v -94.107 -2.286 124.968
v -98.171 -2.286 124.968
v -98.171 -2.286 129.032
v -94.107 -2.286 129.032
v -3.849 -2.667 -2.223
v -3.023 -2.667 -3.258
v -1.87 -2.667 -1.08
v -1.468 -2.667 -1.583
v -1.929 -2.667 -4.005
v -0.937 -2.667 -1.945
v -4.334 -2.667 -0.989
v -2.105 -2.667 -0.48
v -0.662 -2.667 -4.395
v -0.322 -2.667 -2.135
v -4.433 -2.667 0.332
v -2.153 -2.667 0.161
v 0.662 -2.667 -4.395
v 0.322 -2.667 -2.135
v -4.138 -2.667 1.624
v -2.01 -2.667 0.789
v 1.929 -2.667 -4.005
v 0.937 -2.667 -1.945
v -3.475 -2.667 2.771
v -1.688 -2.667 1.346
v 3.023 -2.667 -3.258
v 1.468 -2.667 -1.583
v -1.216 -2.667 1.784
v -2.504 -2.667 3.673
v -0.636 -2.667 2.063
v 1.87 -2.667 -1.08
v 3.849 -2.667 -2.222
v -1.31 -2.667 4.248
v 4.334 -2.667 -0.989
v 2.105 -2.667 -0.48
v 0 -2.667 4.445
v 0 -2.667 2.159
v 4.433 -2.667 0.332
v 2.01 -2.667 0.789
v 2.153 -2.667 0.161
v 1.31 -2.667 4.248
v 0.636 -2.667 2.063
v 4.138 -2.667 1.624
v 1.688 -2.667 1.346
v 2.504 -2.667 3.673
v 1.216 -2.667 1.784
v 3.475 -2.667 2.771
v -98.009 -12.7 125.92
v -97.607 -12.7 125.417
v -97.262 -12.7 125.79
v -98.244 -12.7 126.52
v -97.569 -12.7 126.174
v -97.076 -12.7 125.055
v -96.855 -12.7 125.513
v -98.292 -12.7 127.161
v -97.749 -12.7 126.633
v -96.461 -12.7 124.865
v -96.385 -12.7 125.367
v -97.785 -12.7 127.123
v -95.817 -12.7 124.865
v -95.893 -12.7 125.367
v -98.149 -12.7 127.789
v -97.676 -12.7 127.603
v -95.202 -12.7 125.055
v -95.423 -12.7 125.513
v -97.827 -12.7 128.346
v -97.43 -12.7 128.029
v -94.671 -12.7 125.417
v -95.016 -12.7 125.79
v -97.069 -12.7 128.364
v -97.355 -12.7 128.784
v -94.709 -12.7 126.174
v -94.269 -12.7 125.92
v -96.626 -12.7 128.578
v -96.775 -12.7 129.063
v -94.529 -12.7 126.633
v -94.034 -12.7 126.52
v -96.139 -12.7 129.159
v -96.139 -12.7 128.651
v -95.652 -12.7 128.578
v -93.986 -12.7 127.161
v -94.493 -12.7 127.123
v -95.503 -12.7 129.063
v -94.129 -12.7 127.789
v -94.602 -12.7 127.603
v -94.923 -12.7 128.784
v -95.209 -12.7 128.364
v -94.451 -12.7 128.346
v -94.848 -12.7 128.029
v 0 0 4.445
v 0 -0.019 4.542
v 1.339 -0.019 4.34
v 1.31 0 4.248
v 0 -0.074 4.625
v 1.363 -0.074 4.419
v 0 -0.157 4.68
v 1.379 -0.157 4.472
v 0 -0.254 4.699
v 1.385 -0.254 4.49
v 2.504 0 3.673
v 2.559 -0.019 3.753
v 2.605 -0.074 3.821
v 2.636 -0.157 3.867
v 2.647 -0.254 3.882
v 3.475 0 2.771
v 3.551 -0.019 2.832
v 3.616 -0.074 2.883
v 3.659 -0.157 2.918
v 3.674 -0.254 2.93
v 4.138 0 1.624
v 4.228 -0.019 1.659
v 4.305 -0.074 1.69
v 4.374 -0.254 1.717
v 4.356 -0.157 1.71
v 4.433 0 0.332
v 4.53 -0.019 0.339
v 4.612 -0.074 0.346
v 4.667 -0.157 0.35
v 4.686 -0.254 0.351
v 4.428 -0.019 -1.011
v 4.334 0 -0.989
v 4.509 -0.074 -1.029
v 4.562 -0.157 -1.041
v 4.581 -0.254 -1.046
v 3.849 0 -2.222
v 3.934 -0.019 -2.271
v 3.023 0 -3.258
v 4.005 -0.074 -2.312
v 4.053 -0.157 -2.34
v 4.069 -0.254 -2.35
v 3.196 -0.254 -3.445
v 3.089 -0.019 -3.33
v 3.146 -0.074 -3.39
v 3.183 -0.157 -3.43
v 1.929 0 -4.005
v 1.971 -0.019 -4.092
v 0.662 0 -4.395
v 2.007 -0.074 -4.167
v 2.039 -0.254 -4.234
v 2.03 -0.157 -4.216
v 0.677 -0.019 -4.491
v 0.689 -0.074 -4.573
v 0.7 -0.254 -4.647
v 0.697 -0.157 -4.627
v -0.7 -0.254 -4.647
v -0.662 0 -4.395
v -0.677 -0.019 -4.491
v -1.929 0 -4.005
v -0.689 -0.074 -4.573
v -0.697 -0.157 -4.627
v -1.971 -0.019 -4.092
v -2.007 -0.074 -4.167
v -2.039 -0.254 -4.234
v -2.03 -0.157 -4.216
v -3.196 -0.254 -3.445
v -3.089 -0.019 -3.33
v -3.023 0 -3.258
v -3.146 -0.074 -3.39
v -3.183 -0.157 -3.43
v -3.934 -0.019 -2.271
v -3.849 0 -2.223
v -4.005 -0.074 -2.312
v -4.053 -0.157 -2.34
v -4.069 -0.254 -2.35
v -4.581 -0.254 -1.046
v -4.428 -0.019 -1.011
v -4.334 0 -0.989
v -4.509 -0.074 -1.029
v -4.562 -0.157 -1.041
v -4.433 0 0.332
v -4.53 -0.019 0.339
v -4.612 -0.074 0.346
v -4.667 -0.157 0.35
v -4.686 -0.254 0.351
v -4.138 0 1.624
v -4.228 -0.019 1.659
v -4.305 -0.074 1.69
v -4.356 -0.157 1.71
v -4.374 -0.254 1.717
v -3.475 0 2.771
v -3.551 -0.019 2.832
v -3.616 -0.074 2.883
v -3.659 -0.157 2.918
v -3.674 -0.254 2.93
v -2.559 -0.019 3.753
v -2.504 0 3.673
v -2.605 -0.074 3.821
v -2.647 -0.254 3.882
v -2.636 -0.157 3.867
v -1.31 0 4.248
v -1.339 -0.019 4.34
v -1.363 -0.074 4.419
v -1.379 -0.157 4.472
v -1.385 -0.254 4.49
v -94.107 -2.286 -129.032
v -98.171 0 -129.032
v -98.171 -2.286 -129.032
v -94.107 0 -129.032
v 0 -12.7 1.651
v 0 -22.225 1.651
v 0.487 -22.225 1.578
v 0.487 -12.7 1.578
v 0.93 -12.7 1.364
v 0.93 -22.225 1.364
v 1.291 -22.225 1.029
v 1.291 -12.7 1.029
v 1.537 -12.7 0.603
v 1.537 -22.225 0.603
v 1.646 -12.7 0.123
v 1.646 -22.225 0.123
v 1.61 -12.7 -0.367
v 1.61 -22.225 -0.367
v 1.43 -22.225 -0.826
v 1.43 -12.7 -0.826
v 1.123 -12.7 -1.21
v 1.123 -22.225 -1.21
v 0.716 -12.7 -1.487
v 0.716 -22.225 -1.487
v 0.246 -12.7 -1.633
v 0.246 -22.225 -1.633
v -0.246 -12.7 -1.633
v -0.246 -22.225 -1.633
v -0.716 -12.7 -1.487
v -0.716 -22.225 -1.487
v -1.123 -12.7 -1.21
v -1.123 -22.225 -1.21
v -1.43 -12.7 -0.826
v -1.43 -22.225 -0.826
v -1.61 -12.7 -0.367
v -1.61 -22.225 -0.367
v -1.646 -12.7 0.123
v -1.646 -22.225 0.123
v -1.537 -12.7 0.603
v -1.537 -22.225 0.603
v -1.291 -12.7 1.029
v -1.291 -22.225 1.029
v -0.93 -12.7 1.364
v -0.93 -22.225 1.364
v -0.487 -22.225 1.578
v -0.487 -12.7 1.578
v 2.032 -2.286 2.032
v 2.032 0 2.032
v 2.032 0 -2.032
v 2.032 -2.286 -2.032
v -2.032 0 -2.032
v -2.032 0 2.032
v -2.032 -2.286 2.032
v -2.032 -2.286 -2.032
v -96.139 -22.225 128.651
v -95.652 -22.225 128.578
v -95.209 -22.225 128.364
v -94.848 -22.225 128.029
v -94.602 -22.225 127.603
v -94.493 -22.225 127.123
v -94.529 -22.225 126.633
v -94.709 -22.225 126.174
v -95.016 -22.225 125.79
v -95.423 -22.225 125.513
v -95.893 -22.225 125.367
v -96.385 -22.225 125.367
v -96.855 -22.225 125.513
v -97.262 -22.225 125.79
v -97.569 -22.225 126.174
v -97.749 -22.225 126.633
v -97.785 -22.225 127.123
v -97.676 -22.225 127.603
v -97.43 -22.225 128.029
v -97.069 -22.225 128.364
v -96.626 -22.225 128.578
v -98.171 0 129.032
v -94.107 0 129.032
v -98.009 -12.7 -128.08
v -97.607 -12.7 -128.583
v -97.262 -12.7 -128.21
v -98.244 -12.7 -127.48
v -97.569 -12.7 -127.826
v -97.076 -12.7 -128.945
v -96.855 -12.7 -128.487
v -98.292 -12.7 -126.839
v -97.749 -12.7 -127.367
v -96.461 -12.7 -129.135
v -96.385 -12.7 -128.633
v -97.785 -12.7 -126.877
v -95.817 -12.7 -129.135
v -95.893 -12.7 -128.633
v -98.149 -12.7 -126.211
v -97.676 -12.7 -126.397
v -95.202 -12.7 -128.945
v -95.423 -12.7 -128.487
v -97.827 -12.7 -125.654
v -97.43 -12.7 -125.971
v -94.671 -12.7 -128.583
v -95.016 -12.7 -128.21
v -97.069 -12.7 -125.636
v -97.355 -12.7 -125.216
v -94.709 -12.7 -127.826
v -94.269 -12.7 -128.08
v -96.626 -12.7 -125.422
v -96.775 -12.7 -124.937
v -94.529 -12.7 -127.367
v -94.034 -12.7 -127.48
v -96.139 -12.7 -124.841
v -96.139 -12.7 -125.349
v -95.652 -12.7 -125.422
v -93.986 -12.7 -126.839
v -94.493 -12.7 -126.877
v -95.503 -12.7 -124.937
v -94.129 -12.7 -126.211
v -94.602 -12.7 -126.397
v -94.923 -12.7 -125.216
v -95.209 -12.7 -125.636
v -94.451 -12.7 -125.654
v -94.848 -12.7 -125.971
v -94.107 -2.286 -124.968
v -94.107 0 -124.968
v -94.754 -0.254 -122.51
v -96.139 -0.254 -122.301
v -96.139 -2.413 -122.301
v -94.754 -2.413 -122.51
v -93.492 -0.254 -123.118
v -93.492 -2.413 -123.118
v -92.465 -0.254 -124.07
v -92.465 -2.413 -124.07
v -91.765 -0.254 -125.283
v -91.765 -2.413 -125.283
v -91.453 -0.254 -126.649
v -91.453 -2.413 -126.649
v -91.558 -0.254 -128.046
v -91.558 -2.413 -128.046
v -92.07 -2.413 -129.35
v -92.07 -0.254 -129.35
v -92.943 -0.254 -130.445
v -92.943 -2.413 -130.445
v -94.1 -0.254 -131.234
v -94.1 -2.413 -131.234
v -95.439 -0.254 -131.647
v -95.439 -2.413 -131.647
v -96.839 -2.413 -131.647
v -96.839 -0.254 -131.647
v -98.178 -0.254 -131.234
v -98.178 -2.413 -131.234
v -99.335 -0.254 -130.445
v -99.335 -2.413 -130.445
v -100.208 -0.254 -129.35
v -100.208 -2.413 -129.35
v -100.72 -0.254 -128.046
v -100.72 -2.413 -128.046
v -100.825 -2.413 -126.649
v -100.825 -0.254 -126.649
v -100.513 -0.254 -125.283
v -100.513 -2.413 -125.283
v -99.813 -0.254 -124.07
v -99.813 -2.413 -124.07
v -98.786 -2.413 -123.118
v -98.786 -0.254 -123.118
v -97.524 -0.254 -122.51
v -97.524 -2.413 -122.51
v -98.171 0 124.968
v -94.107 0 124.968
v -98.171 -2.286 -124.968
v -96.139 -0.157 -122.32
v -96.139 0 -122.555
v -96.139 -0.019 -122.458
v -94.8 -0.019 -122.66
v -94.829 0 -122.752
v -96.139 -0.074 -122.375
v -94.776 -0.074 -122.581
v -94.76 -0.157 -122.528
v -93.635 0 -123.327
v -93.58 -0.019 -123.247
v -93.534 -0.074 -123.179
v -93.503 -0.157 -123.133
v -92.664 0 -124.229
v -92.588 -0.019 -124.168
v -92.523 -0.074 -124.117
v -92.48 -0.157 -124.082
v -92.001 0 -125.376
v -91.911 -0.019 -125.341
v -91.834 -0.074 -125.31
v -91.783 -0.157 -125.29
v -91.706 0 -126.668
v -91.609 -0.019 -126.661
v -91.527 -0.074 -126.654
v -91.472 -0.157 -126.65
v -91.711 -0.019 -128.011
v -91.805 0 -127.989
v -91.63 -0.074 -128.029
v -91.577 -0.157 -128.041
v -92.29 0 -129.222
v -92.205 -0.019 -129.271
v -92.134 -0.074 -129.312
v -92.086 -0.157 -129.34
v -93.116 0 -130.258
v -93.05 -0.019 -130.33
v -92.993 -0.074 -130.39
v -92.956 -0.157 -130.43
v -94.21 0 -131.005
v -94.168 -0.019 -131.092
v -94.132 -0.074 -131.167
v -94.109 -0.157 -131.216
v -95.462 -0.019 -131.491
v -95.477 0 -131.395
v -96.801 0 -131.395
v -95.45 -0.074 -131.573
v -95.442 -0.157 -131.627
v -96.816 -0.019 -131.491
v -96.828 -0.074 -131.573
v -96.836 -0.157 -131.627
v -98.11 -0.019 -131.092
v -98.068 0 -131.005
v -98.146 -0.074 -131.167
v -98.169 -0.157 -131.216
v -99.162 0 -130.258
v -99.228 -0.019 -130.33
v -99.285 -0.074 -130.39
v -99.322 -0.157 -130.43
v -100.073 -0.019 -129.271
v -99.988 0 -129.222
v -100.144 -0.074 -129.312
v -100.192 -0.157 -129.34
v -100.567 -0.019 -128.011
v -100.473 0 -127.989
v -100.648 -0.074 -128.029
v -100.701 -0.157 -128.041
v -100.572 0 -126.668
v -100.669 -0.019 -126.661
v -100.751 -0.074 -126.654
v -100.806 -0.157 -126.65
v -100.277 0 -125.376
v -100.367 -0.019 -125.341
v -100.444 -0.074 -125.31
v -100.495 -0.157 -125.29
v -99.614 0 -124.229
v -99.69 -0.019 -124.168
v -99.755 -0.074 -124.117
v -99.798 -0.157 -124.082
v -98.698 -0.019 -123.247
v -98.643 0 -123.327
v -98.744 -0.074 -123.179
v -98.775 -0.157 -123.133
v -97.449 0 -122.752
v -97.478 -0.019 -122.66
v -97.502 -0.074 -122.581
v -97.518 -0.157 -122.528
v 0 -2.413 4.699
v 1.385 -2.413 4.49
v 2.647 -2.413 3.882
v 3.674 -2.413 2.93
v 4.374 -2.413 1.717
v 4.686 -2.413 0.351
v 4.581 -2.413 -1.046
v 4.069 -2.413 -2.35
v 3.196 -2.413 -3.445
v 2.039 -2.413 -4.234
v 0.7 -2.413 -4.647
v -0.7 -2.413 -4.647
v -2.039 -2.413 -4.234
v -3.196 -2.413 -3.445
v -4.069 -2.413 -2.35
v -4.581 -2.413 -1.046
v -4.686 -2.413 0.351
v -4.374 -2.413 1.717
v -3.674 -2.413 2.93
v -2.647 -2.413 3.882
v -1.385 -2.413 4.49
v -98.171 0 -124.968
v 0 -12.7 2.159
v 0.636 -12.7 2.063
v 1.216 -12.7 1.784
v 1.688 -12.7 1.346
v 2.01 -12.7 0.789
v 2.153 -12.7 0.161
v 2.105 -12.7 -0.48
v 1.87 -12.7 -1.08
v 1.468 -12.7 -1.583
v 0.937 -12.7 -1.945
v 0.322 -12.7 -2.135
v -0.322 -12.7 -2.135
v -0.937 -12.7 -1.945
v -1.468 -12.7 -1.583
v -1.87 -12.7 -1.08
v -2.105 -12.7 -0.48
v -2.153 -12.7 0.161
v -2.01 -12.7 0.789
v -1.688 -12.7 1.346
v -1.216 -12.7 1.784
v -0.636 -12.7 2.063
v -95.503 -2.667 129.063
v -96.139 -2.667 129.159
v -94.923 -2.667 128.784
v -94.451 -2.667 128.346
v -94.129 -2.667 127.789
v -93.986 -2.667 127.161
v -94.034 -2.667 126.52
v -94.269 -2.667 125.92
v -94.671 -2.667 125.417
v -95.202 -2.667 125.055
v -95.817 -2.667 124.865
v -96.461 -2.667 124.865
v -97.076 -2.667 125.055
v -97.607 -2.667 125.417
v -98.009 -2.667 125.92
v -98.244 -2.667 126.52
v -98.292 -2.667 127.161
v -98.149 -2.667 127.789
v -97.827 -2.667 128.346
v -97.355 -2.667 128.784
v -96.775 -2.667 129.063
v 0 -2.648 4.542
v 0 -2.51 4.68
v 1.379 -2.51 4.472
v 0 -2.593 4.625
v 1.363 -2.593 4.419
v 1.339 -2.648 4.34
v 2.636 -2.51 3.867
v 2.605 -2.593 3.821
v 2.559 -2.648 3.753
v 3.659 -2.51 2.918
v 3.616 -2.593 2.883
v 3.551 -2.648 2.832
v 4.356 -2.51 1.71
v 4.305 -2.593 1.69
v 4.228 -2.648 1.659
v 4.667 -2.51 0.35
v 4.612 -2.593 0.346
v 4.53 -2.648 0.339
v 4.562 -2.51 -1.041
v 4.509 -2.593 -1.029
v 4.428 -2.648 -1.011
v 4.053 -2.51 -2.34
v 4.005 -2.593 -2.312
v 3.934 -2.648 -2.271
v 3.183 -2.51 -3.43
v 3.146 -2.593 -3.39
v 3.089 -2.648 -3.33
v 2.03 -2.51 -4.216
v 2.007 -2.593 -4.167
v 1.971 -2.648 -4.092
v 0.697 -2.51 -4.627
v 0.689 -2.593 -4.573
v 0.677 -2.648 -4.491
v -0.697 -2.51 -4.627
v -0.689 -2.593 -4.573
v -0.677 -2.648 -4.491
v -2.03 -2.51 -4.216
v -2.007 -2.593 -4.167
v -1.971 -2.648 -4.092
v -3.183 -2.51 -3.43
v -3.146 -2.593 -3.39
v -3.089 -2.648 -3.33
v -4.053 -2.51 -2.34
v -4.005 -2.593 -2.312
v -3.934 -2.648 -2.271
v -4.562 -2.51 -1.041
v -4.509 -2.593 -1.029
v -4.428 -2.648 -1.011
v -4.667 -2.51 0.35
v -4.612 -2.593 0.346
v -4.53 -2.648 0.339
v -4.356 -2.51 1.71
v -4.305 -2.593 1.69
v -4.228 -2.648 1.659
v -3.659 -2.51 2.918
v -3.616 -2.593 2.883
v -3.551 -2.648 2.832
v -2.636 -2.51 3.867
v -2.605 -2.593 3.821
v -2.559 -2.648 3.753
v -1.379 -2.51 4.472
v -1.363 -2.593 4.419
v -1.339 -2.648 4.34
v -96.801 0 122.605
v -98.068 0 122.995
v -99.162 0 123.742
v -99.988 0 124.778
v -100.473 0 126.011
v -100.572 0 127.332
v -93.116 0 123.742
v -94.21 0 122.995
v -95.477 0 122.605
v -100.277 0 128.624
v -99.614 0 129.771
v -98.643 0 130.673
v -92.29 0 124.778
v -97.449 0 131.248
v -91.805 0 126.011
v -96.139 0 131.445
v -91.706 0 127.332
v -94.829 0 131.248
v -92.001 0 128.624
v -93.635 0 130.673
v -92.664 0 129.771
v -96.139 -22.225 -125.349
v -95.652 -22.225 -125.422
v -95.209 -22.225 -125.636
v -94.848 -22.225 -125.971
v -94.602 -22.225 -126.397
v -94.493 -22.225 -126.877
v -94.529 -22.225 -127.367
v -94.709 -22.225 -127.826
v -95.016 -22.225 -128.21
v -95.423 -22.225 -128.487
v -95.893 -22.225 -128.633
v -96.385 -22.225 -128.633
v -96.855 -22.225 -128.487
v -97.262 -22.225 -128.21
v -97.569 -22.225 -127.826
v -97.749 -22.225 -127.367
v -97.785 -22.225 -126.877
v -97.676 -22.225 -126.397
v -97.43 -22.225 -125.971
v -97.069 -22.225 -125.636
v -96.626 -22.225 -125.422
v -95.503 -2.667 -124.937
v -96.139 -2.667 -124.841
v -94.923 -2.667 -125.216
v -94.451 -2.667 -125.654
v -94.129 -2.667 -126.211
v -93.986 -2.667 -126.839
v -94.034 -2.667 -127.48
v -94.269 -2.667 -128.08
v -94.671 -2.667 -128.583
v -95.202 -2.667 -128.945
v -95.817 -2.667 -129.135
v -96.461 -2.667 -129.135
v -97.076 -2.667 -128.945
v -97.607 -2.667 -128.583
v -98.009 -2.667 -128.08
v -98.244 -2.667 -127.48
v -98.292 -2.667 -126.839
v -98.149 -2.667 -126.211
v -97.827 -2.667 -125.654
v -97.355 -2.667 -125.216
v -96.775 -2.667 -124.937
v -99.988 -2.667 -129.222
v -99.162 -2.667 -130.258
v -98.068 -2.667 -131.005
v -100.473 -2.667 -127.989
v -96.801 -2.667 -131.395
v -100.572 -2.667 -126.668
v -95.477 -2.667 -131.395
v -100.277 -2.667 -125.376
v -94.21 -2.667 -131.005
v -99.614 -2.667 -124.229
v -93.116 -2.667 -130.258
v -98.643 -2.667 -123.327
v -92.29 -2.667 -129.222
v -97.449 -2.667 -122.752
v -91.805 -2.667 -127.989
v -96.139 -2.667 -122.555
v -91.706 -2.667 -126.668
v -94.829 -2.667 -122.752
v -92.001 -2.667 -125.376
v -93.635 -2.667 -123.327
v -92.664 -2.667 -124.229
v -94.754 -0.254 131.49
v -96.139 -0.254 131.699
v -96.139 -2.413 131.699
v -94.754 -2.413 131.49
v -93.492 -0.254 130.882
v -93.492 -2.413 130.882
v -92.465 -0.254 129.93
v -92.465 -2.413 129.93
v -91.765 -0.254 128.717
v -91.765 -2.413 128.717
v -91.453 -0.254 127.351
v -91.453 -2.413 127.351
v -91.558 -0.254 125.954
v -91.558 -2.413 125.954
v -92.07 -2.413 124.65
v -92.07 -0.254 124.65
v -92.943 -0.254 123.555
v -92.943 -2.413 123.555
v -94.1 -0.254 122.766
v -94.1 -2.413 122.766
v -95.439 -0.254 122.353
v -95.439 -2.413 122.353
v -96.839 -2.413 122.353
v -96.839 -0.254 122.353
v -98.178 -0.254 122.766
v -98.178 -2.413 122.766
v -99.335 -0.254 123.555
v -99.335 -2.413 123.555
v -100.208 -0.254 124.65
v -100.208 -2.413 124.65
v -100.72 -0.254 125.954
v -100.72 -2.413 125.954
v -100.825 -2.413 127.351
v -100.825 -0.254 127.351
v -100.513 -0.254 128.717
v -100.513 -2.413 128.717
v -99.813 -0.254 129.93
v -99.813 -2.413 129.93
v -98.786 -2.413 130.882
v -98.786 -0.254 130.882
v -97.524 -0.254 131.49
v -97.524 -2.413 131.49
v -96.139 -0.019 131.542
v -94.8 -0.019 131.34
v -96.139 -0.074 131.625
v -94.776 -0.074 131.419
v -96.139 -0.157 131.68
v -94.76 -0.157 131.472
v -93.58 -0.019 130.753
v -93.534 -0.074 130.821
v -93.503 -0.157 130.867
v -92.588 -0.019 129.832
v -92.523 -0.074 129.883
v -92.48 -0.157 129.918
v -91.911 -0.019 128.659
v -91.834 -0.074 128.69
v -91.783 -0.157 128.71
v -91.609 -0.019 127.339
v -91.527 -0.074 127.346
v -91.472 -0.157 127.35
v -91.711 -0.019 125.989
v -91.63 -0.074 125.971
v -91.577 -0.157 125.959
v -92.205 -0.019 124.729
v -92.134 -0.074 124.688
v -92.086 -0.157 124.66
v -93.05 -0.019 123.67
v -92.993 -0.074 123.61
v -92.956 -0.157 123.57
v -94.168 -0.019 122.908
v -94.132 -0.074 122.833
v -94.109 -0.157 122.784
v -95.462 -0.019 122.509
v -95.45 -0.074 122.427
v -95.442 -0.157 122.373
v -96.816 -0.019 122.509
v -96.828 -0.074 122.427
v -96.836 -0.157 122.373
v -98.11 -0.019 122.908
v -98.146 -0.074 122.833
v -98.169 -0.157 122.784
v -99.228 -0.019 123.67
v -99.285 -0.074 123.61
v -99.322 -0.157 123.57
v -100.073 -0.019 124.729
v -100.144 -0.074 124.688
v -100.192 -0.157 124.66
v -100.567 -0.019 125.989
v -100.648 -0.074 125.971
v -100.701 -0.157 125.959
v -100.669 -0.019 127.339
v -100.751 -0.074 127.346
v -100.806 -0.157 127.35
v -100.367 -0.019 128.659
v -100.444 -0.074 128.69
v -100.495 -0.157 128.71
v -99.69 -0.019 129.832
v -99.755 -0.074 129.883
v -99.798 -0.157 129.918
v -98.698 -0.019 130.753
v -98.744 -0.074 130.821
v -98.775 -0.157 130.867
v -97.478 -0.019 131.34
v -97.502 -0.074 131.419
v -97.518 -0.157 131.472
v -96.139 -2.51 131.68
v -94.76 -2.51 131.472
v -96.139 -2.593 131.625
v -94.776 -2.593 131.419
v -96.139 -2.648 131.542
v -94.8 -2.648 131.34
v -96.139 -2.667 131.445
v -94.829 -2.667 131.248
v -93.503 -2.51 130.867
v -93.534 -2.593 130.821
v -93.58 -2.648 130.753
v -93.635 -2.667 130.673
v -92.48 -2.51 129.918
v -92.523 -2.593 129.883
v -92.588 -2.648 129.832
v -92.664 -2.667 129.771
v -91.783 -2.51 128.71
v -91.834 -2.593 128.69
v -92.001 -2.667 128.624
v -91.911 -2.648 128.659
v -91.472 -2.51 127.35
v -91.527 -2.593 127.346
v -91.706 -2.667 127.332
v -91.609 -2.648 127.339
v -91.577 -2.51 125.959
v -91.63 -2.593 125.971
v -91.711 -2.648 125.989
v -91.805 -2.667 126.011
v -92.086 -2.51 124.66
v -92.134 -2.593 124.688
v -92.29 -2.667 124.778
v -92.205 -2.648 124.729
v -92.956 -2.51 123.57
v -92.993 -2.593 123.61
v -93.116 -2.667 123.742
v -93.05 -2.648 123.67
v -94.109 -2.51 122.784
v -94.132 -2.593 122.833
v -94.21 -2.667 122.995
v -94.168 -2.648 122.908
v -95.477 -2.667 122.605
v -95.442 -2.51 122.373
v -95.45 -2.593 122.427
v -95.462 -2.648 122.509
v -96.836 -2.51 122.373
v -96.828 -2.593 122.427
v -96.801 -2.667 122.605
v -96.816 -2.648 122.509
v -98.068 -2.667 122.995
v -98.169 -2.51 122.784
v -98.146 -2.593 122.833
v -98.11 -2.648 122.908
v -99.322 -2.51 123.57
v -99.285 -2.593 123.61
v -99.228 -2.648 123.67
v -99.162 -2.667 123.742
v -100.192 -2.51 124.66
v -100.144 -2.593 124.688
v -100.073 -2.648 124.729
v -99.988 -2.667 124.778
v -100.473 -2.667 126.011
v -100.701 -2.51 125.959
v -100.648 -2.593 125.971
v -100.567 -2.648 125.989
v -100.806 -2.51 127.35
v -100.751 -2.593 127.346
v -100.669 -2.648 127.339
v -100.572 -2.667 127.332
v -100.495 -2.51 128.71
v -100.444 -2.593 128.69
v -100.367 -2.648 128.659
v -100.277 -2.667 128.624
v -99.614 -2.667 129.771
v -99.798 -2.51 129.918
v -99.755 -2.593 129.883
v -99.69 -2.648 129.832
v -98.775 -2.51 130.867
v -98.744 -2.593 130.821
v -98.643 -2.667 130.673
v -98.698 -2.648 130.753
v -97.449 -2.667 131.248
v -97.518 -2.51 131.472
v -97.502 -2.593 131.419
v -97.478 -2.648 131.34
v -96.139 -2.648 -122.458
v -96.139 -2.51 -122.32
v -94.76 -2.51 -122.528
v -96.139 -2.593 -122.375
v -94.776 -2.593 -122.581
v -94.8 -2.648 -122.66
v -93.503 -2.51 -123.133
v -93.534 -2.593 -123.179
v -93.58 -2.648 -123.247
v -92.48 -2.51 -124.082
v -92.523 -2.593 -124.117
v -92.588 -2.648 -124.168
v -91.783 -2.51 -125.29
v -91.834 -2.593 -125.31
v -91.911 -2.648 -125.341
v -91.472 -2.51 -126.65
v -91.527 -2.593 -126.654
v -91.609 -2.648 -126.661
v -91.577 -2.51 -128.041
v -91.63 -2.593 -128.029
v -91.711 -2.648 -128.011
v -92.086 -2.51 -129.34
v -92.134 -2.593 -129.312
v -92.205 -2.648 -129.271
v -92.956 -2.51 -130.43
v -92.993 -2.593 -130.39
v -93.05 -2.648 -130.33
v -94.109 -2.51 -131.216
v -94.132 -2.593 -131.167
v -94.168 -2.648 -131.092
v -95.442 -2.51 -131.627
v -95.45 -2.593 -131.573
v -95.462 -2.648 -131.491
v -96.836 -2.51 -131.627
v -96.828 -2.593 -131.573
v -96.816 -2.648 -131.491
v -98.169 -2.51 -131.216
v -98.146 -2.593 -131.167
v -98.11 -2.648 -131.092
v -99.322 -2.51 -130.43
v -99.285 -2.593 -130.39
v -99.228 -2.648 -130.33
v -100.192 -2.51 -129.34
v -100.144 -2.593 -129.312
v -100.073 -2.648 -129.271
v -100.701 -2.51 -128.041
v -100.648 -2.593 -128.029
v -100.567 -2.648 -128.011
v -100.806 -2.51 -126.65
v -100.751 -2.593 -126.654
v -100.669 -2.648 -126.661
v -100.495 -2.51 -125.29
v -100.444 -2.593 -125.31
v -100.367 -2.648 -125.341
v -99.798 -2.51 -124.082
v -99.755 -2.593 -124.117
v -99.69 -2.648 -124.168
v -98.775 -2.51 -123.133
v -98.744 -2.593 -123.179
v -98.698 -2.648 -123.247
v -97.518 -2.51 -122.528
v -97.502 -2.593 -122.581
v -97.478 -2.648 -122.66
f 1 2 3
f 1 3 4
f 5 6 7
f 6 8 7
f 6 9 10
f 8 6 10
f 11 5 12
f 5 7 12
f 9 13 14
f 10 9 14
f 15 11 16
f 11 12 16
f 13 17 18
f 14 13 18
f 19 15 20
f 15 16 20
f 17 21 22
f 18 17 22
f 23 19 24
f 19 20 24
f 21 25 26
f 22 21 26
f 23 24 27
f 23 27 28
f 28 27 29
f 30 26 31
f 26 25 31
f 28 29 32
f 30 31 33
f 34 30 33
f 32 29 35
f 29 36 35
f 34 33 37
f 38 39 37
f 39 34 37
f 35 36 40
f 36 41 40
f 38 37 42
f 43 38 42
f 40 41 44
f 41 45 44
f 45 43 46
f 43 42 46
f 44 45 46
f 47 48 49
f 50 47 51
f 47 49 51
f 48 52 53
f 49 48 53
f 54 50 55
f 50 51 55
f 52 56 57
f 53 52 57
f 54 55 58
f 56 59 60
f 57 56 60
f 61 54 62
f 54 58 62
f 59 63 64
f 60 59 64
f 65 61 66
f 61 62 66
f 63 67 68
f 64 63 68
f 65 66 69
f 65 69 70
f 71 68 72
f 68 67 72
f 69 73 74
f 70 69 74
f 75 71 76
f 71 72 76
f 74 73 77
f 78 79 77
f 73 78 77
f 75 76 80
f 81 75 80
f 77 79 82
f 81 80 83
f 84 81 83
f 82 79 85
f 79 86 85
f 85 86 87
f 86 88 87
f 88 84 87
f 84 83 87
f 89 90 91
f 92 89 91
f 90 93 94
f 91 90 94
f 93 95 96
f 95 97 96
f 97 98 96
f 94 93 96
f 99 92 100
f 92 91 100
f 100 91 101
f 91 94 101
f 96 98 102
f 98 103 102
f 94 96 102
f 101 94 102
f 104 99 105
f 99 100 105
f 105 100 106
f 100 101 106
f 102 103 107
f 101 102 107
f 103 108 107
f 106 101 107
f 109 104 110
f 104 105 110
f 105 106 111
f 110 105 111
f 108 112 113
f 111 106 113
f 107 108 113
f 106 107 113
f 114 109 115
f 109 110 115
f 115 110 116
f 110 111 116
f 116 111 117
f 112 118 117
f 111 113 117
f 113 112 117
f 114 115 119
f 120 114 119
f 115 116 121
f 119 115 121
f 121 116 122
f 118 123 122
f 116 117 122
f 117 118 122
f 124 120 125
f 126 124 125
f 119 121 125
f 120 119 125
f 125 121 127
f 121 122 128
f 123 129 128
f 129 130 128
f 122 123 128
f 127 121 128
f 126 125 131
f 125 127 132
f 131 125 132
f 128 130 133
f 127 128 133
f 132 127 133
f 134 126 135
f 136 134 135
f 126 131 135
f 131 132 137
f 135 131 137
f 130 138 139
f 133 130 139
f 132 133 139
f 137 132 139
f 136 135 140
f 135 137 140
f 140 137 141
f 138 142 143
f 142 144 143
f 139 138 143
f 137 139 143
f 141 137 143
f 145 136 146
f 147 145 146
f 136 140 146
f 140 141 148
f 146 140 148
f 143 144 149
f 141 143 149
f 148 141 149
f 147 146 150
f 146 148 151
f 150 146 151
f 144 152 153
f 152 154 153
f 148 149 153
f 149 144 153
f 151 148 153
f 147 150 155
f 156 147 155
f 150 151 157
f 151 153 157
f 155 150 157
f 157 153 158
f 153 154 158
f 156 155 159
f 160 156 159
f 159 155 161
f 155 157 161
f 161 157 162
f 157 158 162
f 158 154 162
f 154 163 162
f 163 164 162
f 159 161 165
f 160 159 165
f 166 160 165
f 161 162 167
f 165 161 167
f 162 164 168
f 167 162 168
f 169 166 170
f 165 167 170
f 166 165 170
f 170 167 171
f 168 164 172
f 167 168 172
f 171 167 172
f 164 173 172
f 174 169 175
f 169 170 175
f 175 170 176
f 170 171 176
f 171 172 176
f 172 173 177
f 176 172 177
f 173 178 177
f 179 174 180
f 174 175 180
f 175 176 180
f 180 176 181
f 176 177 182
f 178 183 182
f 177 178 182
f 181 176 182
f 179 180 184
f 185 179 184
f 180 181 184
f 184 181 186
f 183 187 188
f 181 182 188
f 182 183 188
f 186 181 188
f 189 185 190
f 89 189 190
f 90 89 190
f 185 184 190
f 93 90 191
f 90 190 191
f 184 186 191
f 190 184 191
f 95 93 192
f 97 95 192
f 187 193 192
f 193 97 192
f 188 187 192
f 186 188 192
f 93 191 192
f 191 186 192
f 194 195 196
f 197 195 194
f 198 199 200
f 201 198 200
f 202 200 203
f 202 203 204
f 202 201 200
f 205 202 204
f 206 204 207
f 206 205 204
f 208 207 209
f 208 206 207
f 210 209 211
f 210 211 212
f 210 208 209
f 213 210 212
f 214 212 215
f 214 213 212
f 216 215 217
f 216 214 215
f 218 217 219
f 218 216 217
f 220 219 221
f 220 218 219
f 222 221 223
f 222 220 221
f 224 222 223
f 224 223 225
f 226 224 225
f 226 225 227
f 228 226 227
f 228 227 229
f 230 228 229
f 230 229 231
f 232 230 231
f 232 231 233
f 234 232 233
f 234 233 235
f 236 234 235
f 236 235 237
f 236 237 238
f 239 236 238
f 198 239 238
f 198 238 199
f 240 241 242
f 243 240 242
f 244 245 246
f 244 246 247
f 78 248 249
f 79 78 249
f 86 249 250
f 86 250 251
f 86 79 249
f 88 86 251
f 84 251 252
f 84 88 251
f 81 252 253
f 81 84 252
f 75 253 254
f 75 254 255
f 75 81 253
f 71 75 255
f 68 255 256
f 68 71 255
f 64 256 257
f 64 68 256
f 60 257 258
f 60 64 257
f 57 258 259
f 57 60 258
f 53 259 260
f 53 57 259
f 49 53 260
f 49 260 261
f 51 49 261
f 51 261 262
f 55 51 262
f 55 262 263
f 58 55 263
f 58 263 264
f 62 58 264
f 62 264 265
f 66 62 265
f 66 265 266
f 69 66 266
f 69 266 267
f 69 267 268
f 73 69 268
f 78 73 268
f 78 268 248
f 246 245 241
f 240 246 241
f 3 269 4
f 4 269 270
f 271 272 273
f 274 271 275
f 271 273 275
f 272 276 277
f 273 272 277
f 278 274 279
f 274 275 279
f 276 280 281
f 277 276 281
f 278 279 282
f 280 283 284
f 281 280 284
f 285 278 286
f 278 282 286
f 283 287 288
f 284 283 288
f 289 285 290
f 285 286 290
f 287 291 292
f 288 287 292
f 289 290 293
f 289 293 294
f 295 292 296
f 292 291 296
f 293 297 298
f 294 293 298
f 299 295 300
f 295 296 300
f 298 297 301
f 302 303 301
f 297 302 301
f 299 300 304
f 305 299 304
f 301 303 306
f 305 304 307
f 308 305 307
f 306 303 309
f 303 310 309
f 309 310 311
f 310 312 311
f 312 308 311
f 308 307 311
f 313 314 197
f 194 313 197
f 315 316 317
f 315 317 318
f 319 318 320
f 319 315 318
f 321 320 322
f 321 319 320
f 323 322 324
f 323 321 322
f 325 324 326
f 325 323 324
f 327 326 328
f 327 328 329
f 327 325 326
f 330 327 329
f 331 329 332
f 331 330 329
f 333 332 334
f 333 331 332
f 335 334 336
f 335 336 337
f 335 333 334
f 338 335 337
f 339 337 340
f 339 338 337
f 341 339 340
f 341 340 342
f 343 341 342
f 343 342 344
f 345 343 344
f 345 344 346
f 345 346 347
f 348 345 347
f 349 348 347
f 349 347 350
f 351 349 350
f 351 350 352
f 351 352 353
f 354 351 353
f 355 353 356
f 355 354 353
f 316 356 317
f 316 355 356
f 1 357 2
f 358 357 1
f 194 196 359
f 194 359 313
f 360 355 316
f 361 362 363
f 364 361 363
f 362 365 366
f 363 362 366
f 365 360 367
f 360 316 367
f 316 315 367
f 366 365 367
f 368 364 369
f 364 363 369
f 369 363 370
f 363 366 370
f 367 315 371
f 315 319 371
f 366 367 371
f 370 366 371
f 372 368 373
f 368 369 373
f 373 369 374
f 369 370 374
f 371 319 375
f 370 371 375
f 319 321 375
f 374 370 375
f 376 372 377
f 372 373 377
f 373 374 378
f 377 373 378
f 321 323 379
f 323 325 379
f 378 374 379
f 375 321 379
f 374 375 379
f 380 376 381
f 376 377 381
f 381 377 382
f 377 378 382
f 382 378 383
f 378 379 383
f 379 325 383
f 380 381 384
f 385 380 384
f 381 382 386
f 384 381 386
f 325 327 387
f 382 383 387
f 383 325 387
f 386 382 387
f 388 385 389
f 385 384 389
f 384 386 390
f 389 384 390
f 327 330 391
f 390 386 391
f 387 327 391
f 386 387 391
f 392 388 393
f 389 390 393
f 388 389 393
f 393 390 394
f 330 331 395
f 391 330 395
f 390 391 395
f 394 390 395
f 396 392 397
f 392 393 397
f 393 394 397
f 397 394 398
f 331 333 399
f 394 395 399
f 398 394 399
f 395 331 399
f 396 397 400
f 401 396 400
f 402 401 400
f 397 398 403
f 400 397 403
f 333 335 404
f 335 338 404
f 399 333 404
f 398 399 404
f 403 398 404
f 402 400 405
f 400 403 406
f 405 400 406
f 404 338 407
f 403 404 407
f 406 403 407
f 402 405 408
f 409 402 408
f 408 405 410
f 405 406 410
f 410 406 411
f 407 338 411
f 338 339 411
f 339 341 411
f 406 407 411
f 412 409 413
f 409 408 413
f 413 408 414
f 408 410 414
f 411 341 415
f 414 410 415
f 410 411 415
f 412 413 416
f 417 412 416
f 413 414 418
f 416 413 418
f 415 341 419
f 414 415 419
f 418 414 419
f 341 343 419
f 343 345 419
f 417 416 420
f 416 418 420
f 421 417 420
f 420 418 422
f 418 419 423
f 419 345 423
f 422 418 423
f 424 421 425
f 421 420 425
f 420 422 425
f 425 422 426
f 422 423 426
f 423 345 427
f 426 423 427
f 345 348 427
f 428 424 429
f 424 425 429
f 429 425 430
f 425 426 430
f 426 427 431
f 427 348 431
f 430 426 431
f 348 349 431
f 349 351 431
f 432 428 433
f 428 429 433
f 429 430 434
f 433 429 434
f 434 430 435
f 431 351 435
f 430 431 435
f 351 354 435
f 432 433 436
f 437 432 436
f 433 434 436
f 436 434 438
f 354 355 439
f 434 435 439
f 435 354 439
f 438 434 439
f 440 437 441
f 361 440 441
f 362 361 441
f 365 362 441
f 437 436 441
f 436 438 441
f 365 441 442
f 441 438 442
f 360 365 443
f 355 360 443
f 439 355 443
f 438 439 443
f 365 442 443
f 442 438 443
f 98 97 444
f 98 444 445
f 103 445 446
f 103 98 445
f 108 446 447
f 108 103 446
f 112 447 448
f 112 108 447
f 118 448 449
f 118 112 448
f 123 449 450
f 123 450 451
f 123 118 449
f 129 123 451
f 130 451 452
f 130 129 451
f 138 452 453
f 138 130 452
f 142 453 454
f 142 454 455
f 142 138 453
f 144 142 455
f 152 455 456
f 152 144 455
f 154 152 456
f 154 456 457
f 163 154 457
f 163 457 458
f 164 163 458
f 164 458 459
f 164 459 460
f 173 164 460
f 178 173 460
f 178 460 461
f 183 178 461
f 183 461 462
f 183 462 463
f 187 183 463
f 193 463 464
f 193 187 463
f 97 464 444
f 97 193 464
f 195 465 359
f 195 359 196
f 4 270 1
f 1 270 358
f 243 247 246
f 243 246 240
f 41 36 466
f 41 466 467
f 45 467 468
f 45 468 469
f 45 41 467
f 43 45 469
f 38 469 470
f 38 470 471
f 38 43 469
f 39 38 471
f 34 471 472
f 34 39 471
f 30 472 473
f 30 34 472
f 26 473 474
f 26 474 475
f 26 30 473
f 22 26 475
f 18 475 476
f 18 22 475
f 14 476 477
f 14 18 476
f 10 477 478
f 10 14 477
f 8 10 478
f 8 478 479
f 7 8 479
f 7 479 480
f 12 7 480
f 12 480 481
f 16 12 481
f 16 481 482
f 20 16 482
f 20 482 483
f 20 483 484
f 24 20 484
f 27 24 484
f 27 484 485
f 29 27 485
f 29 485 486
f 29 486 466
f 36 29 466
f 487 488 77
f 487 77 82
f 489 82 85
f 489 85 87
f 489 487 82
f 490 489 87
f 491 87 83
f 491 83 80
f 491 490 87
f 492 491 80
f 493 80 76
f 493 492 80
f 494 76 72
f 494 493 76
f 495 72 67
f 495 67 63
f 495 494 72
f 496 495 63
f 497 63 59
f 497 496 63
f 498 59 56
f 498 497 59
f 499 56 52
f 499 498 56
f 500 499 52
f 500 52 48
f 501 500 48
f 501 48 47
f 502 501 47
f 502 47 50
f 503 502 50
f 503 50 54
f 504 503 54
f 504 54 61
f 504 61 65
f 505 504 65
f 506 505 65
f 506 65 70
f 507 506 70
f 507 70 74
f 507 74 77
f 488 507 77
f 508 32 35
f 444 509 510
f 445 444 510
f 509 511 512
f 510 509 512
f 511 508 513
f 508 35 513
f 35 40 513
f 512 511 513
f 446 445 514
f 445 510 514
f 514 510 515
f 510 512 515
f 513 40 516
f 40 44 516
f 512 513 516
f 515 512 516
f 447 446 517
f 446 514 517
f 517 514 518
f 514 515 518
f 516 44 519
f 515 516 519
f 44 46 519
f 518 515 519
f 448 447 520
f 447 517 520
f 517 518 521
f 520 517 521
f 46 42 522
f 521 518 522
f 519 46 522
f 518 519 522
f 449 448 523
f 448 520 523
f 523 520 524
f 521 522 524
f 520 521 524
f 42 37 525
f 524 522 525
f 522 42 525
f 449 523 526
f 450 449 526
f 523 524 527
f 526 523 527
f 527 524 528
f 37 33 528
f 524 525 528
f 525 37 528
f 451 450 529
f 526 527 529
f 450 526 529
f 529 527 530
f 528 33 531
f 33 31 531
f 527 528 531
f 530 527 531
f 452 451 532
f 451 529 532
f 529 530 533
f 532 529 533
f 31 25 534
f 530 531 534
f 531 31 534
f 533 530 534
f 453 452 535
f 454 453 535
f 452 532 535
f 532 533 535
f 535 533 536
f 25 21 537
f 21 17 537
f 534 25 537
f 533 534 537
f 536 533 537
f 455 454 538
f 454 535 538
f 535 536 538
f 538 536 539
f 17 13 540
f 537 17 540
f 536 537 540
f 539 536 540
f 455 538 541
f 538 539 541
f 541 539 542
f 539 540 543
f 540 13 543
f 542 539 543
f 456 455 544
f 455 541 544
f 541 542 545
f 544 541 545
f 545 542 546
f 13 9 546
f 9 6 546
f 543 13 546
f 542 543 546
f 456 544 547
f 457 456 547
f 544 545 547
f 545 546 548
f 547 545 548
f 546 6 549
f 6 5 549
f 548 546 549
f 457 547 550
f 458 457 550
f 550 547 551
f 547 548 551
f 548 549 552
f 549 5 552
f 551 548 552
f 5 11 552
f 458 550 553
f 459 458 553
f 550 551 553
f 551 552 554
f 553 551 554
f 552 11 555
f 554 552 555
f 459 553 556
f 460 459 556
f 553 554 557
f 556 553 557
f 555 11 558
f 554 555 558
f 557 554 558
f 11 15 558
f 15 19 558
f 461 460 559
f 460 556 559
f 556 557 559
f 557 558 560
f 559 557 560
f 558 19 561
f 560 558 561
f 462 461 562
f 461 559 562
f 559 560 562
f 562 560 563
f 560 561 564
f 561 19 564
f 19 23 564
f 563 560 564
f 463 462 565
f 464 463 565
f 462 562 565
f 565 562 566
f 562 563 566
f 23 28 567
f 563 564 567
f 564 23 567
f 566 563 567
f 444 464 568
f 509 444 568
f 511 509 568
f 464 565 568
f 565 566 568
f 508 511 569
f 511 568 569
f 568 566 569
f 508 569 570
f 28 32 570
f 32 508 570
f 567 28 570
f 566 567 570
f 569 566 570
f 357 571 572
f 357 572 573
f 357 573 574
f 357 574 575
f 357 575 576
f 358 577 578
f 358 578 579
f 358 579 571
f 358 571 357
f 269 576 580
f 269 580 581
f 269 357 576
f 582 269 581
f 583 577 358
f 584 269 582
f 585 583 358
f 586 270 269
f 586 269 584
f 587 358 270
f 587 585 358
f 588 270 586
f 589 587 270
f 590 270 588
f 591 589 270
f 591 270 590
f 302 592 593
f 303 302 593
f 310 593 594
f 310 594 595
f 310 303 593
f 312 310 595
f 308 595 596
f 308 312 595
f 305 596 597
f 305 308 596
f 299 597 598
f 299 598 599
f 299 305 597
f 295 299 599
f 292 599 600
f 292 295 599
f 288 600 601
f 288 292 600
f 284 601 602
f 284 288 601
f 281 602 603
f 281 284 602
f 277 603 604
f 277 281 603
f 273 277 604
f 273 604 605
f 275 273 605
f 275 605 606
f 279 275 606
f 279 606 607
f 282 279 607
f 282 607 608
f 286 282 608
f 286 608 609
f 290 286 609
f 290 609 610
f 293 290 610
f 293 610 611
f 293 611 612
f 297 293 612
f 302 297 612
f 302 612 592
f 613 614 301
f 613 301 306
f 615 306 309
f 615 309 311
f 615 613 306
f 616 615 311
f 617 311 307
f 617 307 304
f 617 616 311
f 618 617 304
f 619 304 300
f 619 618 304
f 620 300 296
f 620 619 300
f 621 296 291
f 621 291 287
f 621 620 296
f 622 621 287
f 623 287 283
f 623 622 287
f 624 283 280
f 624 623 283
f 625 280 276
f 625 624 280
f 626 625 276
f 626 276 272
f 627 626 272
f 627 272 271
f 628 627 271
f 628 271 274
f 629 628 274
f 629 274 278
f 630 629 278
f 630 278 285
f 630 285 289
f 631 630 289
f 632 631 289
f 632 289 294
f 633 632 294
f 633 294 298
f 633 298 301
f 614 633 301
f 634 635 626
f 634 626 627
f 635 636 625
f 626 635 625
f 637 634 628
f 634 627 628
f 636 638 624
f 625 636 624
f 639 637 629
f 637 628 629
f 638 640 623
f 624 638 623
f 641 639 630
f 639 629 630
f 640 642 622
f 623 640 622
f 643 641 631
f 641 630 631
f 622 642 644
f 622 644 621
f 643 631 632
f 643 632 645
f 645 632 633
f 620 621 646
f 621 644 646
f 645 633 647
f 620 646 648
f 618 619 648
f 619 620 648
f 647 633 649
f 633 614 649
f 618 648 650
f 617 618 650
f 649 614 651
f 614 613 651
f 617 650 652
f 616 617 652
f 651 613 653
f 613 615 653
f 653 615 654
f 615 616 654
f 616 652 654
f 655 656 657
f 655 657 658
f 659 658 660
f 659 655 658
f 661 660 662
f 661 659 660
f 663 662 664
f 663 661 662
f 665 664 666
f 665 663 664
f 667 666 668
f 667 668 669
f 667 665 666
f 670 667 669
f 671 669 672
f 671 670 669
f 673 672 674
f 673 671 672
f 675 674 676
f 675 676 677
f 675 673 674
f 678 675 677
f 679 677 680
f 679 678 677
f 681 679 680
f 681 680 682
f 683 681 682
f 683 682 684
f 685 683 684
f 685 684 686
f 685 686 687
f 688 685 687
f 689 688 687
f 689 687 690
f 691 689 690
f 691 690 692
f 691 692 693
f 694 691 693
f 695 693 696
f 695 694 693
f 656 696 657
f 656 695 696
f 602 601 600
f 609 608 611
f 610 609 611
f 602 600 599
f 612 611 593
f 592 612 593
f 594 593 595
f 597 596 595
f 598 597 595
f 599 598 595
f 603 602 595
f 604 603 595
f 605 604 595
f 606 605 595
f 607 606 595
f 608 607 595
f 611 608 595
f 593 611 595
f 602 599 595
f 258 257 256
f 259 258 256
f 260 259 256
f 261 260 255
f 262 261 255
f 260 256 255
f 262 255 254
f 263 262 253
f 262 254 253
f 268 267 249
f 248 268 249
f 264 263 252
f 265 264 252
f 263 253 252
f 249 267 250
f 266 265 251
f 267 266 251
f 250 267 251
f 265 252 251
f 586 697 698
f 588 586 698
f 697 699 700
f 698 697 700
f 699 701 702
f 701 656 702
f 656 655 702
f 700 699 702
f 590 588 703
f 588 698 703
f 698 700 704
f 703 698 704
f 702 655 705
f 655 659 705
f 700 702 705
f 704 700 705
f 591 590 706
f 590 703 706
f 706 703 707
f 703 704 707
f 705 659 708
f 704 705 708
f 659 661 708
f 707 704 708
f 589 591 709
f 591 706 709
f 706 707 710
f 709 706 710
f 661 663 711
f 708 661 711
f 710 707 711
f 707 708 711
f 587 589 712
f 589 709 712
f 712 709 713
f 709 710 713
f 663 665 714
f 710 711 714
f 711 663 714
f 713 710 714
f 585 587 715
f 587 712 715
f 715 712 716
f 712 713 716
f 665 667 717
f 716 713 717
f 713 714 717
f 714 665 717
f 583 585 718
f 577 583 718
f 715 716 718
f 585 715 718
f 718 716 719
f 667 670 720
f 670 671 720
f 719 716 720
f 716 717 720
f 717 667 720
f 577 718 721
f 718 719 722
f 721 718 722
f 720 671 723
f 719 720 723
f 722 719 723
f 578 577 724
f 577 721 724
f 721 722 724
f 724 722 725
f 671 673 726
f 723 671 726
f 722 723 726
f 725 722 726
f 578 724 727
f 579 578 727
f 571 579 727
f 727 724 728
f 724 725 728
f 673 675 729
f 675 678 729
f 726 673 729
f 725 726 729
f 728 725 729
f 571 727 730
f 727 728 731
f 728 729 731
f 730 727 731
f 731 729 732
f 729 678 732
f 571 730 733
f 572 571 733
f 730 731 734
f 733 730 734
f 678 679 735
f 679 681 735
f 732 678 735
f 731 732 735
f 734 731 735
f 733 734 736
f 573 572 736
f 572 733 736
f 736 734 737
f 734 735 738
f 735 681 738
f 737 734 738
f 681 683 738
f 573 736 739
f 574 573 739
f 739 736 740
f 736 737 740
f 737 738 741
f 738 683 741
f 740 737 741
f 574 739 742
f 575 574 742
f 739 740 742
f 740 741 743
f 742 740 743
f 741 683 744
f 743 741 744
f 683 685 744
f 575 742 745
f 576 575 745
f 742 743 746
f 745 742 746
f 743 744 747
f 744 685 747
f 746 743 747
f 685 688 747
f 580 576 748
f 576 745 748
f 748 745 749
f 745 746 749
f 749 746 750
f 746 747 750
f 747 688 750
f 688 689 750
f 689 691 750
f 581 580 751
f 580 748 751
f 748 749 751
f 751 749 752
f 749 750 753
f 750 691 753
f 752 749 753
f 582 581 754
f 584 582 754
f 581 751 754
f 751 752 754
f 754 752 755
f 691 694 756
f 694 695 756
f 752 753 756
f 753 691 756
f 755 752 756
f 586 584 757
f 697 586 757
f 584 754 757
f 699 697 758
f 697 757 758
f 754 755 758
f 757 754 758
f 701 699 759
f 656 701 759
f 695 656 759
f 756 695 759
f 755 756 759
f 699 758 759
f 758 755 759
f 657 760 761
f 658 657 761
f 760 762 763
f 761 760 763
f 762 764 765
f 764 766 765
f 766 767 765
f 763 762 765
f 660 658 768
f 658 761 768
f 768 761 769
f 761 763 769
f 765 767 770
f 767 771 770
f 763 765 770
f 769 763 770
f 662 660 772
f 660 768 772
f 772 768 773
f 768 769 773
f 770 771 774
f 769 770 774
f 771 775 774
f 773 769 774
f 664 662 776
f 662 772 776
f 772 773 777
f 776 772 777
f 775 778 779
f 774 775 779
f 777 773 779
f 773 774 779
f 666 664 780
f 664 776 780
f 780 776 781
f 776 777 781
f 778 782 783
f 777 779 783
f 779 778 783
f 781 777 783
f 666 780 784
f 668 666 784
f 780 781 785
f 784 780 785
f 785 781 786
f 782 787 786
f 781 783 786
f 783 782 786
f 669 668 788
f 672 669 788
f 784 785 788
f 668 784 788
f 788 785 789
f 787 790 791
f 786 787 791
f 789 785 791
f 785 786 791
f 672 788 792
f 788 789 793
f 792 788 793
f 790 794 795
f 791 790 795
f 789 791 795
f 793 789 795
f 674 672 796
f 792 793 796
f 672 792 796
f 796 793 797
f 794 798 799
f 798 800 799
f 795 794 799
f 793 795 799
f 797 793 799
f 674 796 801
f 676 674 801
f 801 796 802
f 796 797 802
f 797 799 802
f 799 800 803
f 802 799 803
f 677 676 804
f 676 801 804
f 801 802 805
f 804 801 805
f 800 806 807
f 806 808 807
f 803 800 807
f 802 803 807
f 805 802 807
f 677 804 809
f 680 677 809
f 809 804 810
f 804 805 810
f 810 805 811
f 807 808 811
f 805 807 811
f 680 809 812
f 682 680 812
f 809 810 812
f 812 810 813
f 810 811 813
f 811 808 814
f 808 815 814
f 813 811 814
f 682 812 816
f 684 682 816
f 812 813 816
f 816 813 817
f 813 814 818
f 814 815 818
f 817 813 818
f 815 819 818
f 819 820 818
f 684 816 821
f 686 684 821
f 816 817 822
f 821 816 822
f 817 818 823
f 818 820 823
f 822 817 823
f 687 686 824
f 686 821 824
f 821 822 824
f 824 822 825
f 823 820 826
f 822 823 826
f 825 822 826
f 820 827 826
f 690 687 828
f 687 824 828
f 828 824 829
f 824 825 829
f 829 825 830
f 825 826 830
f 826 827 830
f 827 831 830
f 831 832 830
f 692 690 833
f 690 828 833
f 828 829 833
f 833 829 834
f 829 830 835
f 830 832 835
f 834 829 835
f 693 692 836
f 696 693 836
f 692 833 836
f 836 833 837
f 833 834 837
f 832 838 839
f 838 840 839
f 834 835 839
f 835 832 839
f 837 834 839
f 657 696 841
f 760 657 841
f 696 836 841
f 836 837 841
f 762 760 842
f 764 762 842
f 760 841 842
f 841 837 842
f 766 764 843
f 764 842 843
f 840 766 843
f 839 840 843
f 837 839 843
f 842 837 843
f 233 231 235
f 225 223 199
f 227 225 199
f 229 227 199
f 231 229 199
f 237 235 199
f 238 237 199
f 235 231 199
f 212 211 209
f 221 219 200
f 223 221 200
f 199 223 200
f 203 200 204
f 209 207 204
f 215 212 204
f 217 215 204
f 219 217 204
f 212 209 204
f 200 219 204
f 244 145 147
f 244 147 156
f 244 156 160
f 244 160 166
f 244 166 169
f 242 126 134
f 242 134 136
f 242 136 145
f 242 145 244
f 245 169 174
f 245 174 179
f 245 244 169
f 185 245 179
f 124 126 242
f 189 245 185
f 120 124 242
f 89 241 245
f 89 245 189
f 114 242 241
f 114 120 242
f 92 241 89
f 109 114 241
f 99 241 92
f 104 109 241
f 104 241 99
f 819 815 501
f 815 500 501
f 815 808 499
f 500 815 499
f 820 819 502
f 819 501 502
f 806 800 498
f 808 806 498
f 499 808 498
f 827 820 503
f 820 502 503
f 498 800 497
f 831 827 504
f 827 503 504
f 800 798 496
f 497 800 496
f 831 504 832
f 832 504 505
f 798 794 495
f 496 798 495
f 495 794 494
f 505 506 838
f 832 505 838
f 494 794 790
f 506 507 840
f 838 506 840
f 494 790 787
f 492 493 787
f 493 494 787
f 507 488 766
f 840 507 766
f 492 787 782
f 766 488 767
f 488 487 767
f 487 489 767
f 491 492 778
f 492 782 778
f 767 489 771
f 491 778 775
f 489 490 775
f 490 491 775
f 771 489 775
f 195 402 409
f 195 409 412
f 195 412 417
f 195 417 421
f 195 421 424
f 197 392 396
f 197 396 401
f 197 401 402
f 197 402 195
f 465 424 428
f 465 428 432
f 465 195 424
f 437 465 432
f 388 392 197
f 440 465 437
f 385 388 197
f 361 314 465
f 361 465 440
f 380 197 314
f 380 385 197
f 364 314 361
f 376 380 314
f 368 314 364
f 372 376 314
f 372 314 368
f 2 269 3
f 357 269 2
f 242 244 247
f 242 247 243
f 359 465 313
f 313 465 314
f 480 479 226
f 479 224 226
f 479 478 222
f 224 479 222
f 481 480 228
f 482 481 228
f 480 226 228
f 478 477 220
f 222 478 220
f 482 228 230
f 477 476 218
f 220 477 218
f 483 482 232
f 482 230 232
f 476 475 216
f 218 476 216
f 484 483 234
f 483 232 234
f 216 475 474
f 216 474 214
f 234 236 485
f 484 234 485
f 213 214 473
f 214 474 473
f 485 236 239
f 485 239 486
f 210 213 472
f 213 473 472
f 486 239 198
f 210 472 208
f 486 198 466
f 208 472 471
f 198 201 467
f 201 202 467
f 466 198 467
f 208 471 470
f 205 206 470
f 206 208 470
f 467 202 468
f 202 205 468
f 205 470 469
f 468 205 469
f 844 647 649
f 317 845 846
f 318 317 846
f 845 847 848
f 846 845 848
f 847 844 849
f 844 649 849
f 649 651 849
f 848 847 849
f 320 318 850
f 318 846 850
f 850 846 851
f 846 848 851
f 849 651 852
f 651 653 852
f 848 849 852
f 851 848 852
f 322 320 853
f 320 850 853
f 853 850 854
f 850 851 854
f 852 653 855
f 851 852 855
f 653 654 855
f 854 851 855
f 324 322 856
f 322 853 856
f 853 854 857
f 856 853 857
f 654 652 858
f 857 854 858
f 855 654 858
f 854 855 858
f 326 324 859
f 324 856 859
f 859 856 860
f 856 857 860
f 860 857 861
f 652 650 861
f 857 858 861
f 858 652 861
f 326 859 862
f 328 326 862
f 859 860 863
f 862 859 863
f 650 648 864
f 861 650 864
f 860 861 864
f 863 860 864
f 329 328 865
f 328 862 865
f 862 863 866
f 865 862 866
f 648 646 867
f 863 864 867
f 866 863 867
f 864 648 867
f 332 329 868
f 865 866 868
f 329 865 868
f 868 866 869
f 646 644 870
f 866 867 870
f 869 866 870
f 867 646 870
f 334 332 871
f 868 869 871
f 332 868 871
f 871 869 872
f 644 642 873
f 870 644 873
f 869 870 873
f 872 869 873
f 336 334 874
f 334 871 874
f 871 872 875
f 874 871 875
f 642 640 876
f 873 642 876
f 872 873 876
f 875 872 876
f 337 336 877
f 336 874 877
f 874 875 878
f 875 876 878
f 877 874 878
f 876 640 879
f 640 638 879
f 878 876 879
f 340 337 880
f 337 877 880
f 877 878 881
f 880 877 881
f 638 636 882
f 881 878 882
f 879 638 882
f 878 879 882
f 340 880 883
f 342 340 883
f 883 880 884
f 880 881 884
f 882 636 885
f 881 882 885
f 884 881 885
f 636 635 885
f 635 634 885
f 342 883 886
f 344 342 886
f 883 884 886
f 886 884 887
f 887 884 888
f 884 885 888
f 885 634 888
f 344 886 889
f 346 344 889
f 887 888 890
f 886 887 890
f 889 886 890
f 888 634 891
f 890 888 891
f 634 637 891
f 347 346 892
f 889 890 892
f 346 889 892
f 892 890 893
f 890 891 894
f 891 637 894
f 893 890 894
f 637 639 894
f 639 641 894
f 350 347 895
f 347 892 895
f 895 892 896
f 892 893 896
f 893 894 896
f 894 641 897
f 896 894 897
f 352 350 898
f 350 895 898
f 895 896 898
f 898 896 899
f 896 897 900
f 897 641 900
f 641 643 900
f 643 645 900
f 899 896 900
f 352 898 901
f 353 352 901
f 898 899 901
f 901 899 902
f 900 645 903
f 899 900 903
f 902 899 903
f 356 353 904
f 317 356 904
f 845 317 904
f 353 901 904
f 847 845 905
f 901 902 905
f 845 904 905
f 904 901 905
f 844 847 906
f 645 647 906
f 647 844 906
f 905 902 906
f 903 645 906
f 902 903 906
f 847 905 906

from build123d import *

# Parameters (mm, degrees)
SKETCH1_R             = 4.699
BOSS_EXTRUDE1_DEPTH   = 2.667
BOSS_EXTRUDE1_2_DEPTH = 2.667
BOSS_EXTRUDE1_3_DEPTH = 2.667
SKETCH2_R             = 2.159
BOSS_EXTRUDE2_DEPTH   = 12.7
SKETCH3_R             = 1.651
BOSS_EXTRUDE3_DEPTH   = 22.225
SKETCH4_W             = 4.064
SKETCH4_H             = 4.064
CUT_EXTRUDE1_DEPTH    = 2.286
FILLET1_R             = 0.254
FILLET2_R             = 0.254
FILLET3_R             = 0.254


with BuildPart() as part:
    # Sketch1 → Boss-Extrude1 (new body)
    with BuildSketch(Plane(origin=(0, 0, 0), x_dir=(1, 0, 0), z_dir=(0, 1, 0))):
        with Locations(Location((0, 0, 0), (0, 0, 270))):
            Circle(SKETCH1_R)
    extrude(amount=-BOSS_EXTRUDE1_DEPTH)



with BuildPart() as body_2:
    # Sketch1 → Boss-Extrude1 2 (new body)
    with BuildSketch(Plane(origin=(0, 0, 0), x_dir=(1, 0, 0), z_dir=(0, 1, 0))):
        with Locations(Location((-96.139, 127, 0), (0, 0, 270))):
            Circle(SKETCH1_R)
    extrude(amount=-BOSS_EXTRUDE1_2_DEPTH)


with BuildPart() as body_3:
    # Sketch1 → Boss-Extrude1 3 (new body)
    with BuildSketch(Plane(origin=(0, 0, 0), x_dir=(1, 0, 0), z_dir=(0, 1, 0))):
        with Locations(Location((-96.139, -127, 0), (0, 0, 270))):
            Circle(SKETCH1_R)
    extrude(amount=-BOSS_EXTRUDE1_3_DEPTH)


with BuildPart() as part_1:
    add(part.part)

    add(body_2.part)  # Boss-Extrude2 merges body 2

    add(body_3.part)  # Boss-Extrude2 merges body 3
    # Sketch2 → Boss-Extrude2 (add)
    with BuildSketch(Plane(origin=(0, 0, 0), x_dir=(1, 0, 0), z_dir=(0, 1, 0))):
        with Locations(Location((-96.139, 127, 0), (0, 0, 270))):
            Circle(SKETCH2_R)
        with Locations(Location((0, 0, 0), (0, 0, 270))):
            Circle(SKETCH2_R)
        with Locations(Location((-96.139, -127, 0), (0, 0, 270))):
            Circle(SKETCH2_R)
    extrude(amount=-BOSS_EXTRUDE2_DEPTH)

    # Sketch3 → Boss-Extrude3 (add)
    with BuildSketch(Plane(origin=(0, 0, 0), x_dir=(1, 0, 0), z_dir=(0, 1, 0))):
        with Locations(Location((-96.139, 127, 0), (0, 0, 270))):
            Circle(SKETCH3_R)
        with Locations(Location((0, 0, 0), (0, 0, 270))):
            Circle(SKETCH3_R)
        with Locations(Location((-96.139, -127, 0), (0, 0, 270))):
            Circle(SKETCH3_R)
    extrude(amount=-BOSS_EXTRUDE3_DEPTH)

    # Sketch4 → Cut-Extrude1 (cut)
    with BuildSketch(Plane(origin=(0, 0, 0), x_dir=(1, 0, 0), z_dir=(0, 1, 0))):
        with Locations((-96.139, 127)):
            Rectangle(SKETCH4_W, SKETCH4_H)
        Rectangle(SKETCH4_W, SKETCH4_H)
        with Locations((-96.139, -127)):
            Rectangle(SKETCH4_W, SKETCH4_H)
    extrude(amount=-CUT_EXTRUDE1_DEPTH, mode=Mode.SUBTRACT)

    # Fillet1
    fillet1_edges = [part_1.edges().sort_by_distance(p)[0] for p in [
        (-96.139, 0, 122.301),
        (-96.139, -2.667, 122.301),
    ]]
    fillet(fillet1_edges, radius=FILLET1_R)

    # Fillet2
    fillet2_edges = [part_1.edges().sort_by_distance(p)[0] for p in [
        (0, 0, -4.699),
        (0, -2.667, -4.699),
    ]]
    fillet(fillet2_edges, radius=FILLET2_R)

    # Fillet3
    fillet3_edges = [part_1.edges().sort_by_distance(p)[0] for p in [
        (-96.139, 0, -131.699),
        (-96.139, -2.667, -131.699),
    ]]
    fillet(fillet3_edges, radius=FILLET3_R)


solid = part_1.part
